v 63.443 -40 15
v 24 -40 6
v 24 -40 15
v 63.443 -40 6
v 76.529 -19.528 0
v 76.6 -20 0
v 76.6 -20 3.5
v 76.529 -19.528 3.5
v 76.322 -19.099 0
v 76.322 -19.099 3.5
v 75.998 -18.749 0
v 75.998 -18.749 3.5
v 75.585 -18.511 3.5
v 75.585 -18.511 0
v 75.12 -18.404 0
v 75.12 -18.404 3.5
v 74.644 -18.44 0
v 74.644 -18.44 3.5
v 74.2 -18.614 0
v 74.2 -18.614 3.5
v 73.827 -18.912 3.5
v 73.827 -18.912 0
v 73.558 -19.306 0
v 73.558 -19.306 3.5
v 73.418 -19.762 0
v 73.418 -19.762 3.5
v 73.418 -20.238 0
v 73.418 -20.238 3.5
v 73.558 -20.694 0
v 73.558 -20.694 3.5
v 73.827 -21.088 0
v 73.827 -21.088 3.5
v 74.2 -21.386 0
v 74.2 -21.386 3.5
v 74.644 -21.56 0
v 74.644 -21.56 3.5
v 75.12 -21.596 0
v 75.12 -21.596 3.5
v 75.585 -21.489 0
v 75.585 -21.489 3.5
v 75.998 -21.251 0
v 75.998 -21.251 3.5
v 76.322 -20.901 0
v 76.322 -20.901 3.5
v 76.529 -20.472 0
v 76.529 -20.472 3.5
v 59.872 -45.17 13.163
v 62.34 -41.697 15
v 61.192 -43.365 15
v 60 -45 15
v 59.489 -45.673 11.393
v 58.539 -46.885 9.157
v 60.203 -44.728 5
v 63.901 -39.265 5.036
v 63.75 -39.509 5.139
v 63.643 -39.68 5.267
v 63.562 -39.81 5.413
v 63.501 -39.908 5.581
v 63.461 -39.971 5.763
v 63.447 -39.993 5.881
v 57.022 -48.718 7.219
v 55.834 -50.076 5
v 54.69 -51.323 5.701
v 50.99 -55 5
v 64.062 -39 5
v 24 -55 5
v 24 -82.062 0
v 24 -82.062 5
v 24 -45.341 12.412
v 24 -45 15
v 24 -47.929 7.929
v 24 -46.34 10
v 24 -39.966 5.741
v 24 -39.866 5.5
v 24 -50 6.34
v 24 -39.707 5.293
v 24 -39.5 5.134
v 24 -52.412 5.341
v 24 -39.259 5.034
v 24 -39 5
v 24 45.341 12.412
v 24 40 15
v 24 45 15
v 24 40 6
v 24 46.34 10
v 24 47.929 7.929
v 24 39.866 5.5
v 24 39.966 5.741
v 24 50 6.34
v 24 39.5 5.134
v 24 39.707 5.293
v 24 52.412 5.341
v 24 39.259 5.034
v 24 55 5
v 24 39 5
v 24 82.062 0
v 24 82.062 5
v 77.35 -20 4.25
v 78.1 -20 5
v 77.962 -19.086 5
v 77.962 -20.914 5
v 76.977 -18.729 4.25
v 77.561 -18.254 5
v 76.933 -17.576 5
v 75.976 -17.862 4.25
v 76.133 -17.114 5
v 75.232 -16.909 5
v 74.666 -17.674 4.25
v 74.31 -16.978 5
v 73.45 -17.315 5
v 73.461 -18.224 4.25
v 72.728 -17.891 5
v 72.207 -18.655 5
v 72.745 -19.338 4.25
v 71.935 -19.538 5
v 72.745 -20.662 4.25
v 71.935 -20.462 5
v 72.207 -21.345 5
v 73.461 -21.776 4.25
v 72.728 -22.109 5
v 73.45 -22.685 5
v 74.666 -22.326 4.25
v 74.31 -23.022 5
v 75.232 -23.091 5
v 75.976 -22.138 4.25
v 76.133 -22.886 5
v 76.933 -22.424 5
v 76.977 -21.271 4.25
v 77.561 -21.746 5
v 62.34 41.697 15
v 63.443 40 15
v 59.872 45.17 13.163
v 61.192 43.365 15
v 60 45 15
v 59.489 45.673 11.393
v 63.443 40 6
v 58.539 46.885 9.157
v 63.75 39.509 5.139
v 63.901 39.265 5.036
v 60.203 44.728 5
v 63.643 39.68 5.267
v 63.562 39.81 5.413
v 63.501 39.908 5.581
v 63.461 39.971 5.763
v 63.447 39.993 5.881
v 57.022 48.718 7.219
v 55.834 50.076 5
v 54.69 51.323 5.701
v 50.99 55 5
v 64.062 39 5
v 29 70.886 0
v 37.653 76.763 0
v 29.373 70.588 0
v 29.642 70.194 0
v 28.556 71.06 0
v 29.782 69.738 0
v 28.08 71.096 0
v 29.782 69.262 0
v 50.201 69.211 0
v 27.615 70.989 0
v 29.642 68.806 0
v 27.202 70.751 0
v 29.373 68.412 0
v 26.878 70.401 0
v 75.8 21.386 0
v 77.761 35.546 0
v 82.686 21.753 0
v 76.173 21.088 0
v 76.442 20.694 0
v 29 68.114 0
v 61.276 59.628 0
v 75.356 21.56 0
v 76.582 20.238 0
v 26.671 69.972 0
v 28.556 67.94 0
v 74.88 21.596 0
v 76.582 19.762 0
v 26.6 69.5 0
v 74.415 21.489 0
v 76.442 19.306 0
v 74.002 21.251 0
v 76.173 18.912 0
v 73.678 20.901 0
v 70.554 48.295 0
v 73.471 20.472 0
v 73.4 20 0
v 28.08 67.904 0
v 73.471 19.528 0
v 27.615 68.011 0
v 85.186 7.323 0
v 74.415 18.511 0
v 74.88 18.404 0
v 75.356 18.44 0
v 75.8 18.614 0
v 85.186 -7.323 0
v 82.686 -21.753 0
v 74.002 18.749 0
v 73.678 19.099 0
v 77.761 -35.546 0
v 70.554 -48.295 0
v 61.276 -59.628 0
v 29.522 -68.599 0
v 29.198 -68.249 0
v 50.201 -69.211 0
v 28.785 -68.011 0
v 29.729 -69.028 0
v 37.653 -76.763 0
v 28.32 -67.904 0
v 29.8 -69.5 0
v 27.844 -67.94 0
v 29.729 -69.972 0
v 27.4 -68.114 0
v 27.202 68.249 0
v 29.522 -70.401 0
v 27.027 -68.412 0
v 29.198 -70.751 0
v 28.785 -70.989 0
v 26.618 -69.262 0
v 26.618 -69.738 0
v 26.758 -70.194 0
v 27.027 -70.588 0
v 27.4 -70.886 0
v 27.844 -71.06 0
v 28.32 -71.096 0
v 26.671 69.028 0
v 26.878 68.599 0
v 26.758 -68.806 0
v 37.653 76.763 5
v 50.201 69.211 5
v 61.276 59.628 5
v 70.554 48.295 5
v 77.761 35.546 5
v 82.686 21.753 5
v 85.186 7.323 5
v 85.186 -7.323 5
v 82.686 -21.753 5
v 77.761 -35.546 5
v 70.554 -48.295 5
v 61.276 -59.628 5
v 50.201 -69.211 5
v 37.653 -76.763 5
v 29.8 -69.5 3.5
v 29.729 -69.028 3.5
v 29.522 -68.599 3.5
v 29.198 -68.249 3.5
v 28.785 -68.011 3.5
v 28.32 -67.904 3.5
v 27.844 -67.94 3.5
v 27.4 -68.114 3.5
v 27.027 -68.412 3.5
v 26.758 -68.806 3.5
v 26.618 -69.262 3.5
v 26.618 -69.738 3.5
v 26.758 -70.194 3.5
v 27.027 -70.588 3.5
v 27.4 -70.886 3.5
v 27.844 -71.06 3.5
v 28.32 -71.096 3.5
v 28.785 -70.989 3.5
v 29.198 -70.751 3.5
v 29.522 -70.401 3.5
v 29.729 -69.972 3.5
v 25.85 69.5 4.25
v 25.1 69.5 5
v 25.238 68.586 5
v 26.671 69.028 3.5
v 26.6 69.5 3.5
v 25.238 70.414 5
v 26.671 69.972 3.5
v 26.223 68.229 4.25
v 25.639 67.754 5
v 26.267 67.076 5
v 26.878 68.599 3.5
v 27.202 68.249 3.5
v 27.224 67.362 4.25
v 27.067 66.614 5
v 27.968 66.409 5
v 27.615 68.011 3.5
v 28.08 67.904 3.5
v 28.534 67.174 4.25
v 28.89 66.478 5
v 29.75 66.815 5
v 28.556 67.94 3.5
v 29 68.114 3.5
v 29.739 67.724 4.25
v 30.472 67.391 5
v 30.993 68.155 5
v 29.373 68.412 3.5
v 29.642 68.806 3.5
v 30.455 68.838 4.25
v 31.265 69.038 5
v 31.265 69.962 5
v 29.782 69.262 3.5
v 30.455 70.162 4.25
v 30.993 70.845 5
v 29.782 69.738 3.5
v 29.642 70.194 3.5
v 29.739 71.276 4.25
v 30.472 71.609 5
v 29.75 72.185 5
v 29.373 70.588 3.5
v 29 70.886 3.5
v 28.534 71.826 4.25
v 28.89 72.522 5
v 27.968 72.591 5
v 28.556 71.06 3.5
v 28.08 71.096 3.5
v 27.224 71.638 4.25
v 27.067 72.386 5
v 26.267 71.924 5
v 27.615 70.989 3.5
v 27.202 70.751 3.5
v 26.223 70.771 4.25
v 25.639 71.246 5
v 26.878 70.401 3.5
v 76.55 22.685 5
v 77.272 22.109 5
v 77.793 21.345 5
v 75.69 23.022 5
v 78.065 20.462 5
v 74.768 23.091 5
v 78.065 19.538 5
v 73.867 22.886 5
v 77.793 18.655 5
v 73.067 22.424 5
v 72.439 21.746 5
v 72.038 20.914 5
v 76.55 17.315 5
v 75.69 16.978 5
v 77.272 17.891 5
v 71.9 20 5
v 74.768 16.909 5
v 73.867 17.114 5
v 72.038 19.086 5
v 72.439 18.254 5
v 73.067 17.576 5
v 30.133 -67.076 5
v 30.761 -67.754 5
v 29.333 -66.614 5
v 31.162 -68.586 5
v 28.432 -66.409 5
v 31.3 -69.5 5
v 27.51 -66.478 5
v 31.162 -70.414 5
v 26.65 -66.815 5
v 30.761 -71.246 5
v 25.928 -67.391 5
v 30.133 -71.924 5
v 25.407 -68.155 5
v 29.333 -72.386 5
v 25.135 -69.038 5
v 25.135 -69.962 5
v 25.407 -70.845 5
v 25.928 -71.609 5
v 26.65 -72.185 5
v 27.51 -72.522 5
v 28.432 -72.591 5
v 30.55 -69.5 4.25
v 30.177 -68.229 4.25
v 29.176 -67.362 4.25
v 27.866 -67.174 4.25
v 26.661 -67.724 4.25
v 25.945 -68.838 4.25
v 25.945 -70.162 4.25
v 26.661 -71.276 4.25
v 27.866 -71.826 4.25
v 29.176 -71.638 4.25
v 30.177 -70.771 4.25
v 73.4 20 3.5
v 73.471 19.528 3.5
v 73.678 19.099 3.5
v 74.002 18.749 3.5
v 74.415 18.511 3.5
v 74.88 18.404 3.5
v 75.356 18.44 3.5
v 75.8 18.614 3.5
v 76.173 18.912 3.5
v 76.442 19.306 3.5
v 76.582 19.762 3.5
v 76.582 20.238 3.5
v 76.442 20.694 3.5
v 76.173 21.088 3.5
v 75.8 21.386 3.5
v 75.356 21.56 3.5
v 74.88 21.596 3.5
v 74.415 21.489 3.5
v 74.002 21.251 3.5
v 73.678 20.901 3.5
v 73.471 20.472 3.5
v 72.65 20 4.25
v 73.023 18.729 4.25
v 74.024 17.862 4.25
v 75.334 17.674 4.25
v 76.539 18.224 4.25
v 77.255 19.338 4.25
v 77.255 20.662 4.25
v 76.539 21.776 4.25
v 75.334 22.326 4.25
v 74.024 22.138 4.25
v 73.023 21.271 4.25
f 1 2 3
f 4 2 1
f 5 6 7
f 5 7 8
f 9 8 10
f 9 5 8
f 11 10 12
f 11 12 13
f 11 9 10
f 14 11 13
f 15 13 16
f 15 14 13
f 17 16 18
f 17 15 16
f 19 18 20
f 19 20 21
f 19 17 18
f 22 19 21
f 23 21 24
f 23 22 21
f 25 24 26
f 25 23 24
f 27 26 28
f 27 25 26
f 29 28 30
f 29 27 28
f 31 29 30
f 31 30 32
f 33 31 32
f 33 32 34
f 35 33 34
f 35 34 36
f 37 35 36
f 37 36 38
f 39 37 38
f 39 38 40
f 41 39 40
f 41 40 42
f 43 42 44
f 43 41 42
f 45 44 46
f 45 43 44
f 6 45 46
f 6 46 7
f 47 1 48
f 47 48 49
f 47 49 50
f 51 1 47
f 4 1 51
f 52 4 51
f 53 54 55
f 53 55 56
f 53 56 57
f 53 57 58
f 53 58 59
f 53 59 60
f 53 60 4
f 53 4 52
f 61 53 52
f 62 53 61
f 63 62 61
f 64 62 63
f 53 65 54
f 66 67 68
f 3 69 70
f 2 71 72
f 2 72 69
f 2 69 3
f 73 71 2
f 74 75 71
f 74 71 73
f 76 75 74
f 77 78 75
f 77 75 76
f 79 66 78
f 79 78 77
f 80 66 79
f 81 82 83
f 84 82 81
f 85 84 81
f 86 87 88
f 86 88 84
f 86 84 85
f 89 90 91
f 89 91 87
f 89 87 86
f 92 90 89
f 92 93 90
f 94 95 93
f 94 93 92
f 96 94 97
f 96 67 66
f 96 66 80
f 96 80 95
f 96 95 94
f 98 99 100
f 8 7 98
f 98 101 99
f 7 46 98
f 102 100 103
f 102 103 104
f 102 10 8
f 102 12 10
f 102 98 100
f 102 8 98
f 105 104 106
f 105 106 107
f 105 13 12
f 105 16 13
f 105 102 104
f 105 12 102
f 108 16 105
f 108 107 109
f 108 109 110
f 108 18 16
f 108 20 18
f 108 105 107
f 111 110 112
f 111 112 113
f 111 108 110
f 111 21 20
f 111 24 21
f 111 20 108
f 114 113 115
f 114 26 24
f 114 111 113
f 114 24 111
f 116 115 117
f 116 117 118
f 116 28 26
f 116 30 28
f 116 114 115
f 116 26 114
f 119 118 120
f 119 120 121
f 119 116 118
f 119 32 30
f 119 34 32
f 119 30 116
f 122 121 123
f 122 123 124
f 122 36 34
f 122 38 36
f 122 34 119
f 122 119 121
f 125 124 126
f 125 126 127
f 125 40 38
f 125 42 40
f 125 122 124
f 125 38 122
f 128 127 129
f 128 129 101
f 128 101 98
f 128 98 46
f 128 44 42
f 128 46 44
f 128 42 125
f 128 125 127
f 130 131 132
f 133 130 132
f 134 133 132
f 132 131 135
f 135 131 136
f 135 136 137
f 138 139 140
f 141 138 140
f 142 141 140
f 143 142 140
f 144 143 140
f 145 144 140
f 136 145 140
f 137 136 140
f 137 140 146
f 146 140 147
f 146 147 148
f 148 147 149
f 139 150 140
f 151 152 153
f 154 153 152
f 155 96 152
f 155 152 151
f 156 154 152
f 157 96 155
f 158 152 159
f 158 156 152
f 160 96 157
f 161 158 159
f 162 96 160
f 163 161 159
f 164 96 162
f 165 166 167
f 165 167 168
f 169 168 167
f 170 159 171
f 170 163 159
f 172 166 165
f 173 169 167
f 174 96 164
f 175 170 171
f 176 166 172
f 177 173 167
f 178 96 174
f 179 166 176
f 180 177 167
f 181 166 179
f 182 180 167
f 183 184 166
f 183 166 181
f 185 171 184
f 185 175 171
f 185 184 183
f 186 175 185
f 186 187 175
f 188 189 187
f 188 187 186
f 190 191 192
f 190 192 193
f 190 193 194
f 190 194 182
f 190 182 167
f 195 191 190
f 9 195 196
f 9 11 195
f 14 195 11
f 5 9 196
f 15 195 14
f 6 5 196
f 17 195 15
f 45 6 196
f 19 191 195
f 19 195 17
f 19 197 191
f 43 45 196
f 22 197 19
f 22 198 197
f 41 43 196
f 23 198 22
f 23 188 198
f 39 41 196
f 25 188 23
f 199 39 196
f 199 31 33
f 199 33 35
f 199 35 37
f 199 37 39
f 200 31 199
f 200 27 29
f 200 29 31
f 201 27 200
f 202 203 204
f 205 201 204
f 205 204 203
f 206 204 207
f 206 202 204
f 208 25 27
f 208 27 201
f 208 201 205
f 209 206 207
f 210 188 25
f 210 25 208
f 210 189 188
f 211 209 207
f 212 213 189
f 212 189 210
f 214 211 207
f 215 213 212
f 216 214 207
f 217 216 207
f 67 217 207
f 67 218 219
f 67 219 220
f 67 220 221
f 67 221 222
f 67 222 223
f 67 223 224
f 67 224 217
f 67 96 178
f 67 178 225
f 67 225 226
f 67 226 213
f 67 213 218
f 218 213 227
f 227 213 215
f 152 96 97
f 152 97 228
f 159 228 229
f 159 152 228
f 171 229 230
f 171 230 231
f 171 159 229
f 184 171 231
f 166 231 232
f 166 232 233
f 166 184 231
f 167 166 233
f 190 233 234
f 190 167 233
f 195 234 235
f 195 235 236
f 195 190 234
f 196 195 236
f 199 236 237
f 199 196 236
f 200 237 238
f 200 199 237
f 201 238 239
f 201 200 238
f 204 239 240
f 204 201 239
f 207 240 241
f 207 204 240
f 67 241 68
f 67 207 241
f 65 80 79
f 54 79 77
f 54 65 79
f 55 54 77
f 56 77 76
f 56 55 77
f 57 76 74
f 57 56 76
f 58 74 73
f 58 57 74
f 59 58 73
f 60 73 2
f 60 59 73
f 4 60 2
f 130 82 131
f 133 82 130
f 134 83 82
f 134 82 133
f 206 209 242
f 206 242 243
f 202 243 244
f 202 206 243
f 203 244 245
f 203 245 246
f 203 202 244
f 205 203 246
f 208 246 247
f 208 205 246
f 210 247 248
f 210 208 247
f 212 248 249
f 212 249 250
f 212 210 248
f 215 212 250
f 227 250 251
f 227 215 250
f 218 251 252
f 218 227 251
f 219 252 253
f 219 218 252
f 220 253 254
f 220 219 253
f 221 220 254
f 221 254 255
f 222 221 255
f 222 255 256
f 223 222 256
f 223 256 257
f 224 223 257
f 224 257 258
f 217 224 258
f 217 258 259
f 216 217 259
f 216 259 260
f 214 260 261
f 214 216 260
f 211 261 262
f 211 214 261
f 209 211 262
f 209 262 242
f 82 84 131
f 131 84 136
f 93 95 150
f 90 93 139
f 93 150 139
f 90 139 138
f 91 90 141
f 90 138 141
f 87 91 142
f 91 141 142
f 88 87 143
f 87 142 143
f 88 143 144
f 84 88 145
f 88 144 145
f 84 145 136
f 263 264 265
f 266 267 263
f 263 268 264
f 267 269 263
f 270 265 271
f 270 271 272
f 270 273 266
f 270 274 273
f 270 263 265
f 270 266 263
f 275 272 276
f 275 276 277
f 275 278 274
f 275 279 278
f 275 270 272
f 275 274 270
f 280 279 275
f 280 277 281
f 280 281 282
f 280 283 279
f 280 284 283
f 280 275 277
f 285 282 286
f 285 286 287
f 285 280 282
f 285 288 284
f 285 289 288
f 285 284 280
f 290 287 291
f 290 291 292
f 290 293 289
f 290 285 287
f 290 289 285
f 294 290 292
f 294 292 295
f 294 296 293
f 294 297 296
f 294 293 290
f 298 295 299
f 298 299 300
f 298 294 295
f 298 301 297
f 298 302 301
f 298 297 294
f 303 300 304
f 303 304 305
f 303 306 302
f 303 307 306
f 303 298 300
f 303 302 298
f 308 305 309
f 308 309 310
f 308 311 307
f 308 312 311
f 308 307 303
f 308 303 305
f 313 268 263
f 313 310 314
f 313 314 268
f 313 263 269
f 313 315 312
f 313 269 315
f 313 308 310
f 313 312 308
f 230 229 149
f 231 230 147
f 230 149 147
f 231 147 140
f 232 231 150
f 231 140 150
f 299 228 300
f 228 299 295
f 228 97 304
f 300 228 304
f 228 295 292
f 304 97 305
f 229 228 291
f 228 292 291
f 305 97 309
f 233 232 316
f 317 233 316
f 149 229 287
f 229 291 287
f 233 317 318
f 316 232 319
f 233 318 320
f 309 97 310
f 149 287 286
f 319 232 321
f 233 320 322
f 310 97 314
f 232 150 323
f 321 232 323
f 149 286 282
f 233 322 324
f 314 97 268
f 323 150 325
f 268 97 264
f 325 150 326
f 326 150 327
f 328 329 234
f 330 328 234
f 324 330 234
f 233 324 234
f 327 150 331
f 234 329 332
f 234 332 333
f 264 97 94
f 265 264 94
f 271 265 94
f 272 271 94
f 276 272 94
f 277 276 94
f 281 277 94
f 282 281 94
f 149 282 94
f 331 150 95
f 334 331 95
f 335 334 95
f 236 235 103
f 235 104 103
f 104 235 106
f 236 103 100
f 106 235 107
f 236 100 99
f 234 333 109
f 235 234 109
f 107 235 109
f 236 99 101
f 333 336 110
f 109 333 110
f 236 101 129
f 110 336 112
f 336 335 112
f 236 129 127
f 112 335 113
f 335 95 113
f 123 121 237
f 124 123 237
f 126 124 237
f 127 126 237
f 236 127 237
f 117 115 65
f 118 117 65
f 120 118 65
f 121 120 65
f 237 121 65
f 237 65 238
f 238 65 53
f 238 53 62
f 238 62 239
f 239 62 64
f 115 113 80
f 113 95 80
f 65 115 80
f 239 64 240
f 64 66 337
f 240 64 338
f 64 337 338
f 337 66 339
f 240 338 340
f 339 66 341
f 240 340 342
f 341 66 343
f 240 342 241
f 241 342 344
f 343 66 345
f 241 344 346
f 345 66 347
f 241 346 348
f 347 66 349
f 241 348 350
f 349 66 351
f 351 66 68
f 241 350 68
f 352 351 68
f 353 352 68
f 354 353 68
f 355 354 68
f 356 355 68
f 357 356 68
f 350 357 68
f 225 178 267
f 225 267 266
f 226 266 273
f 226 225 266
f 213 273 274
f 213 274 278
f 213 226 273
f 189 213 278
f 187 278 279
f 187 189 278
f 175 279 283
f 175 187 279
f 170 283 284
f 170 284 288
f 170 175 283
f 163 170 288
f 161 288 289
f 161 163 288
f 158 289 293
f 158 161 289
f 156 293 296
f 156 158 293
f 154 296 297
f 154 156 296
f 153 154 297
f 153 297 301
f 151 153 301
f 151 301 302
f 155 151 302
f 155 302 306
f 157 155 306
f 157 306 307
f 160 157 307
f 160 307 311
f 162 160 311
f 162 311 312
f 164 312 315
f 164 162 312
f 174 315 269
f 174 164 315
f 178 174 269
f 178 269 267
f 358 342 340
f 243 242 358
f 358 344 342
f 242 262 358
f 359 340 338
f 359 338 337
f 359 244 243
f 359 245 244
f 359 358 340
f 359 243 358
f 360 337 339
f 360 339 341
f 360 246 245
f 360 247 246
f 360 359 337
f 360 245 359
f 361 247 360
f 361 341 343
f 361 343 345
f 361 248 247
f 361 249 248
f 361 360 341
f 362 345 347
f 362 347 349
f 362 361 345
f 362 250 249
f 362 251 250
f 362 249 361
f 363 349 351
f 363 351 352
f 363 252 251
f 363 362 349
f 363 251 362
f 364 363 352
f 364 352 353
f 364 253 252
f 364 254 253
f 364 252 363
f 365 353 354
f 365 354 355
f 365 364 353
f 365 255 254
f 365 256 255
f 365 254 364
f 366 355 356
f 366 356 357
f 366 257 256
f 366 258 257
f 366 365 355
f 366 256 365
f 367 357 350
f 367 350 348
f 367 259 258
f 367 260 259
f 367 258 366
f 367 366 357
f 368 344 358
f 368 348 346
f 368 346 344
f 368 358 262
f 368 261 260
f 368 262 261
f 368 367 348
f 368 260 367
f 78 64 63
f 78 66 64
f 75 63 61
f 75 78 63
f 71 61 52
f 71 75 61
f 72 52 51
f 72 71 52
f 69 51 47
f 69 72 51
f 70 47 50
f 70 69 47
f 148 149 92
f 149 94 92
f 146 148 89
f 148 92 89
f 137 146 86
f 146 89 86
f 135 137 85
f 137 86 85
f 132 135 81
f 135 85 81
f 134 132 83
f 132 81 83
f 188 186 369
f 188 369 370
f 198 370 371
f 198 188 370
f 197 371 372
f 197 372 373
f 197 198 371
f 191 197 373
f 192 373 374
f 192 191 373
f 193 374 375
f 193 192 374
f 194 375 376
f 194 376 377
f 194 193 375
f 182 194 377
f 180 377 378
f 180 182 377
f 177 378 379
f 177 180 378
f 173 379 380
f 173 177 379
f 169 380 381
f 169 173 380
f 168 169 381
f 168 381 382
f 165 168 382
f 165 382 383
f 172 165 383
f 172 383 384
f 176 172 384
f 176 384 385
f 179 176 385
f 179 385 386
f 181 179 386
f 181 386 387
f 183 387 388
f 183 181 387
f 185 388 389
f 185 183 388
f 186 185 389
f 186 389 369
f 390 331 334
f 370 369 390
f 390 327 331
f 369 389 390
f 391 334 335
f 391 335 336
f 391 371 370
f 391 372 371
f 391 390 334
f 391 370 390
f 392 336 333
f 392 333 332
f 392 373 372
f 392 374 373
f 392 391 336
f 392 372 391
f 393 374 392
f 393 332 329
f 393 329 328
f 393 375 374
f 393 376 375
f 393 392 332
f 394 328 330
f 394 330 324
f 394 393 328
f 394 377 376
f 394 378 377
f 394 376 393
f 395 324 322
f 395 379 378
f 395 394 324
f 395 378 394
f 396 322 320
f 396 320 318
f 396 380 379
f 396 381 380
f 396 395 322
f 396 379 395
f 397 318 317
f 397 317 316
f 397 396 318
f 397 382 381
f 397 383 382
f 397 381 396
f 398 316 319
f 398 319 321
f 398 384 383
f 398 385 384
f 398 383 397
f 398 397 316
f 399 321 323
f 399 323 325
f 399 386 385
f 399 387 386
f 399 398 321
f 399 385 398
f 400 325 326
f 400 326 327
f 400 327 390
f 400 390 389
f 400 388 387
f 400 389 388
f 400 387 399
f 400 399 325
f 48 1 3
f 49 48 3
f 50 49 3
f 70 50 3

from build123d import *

# Parameters (mm, degrees)
SKETCH1_R           = 1.6
BOSS_EXTRUDE2_DEPTH = 5
BOSS_EXTRUDE3_DEPTH = 10
CHAMFER1_SIZE       = 1.5
FILLET1_R           = 10
FILLET2_R           = 1


with BuildPart() as part:
    # Sketch1 → Boss-Extrude2 (new body)
    with BuildSketch(Plane(origin=(0, 0, 0), x_dir=(0, 1, 0), z_dir=(0, 0, 1))):
        with BuildLine():
            Line((-82.0624762, -24), (82.0624762, -24))
            ThreePointArc((82.0624762, -24), (0, -85.5), (-82.0624762, -24))
        make_face()
        with Locations(Location((-20, -75, 0), (0, 0, 270))):
            Circle(SKETCH1_R, mode=Mode.SUBTRACT)
        with Locations(Location((20, -75, 0), (0, 0, 90))):
            Circle(SKETCH1_R, mode=Mode.SUBTRACT)
        with Locations(Location((-69.5, -28.2, 0), (0, 0, 270))):
            Circle(SKETCH1_R, mode=Mode.SUBTRACT)
        with Locations(Location((69.5, -28.2, 0), (0, 0, 90))):
            Circle(SKETCH1_R, mode=Mode.SUBTRACT)
    extrude(amount=BOSS_EXTRUDE2_DEPTH)

    # Sketch2 → Boss-Extrude3 (add)
    with BuildSketch(Plane.XY.offset(5)):
        with BuildLine():
            Line((60, 45), (24, 45))
            Line((24, 45), (24, 40))
            Line((24, 40), (63.442887702, 40))
            ThreePointArc((63.442887702, 40), (61.772053803, 42.534848876), (60, 45))
        make_face()
        with BuildLine():
            Line((24, -45), (24, -40))
            Line((24, -40), (63.442887702, -40))
            ThreePointArc((63.442887702, -40), (61.772053803, -42.534848876), (60, -45))
            Line((60, -45), (24, -45))
        make_face()
    extrude(amount=BOSS_EXTRUDE3_DEPTH)

    # Chamfer1
    chamfer1_edges = [part.edges().sort_by_distance(p)[0] for p in [
        (76.6, 20, 5),
        (26.6, -69.5, 5),
        (29.8, 69.5, 5),
        (73.4, -20, 5),
    ]]
    chamfer(chamfer1_edges, length=CHAMFER1_SIZE)

    # Fillet1
    fillet1_edges = [part.edges().sort_by_distance(p)[0] for p in [
        (42, -45, 5),
        (42, 45, 5),
    ]]
    fillet(fillet1_edges, radius=FILLET1_R - 0.0001)  # a hair under: the kernel refuses the full size

    # Fillet2
    fillet2_edges = [part.edges().sort_by_distance(p)[0] for p in [
        (43.721443851, 40, 5),
        (43.721443851, -40, 5),
    ]]
    fillet(fillet2_edges, radius=FILLET2_R)


solid = part.part
